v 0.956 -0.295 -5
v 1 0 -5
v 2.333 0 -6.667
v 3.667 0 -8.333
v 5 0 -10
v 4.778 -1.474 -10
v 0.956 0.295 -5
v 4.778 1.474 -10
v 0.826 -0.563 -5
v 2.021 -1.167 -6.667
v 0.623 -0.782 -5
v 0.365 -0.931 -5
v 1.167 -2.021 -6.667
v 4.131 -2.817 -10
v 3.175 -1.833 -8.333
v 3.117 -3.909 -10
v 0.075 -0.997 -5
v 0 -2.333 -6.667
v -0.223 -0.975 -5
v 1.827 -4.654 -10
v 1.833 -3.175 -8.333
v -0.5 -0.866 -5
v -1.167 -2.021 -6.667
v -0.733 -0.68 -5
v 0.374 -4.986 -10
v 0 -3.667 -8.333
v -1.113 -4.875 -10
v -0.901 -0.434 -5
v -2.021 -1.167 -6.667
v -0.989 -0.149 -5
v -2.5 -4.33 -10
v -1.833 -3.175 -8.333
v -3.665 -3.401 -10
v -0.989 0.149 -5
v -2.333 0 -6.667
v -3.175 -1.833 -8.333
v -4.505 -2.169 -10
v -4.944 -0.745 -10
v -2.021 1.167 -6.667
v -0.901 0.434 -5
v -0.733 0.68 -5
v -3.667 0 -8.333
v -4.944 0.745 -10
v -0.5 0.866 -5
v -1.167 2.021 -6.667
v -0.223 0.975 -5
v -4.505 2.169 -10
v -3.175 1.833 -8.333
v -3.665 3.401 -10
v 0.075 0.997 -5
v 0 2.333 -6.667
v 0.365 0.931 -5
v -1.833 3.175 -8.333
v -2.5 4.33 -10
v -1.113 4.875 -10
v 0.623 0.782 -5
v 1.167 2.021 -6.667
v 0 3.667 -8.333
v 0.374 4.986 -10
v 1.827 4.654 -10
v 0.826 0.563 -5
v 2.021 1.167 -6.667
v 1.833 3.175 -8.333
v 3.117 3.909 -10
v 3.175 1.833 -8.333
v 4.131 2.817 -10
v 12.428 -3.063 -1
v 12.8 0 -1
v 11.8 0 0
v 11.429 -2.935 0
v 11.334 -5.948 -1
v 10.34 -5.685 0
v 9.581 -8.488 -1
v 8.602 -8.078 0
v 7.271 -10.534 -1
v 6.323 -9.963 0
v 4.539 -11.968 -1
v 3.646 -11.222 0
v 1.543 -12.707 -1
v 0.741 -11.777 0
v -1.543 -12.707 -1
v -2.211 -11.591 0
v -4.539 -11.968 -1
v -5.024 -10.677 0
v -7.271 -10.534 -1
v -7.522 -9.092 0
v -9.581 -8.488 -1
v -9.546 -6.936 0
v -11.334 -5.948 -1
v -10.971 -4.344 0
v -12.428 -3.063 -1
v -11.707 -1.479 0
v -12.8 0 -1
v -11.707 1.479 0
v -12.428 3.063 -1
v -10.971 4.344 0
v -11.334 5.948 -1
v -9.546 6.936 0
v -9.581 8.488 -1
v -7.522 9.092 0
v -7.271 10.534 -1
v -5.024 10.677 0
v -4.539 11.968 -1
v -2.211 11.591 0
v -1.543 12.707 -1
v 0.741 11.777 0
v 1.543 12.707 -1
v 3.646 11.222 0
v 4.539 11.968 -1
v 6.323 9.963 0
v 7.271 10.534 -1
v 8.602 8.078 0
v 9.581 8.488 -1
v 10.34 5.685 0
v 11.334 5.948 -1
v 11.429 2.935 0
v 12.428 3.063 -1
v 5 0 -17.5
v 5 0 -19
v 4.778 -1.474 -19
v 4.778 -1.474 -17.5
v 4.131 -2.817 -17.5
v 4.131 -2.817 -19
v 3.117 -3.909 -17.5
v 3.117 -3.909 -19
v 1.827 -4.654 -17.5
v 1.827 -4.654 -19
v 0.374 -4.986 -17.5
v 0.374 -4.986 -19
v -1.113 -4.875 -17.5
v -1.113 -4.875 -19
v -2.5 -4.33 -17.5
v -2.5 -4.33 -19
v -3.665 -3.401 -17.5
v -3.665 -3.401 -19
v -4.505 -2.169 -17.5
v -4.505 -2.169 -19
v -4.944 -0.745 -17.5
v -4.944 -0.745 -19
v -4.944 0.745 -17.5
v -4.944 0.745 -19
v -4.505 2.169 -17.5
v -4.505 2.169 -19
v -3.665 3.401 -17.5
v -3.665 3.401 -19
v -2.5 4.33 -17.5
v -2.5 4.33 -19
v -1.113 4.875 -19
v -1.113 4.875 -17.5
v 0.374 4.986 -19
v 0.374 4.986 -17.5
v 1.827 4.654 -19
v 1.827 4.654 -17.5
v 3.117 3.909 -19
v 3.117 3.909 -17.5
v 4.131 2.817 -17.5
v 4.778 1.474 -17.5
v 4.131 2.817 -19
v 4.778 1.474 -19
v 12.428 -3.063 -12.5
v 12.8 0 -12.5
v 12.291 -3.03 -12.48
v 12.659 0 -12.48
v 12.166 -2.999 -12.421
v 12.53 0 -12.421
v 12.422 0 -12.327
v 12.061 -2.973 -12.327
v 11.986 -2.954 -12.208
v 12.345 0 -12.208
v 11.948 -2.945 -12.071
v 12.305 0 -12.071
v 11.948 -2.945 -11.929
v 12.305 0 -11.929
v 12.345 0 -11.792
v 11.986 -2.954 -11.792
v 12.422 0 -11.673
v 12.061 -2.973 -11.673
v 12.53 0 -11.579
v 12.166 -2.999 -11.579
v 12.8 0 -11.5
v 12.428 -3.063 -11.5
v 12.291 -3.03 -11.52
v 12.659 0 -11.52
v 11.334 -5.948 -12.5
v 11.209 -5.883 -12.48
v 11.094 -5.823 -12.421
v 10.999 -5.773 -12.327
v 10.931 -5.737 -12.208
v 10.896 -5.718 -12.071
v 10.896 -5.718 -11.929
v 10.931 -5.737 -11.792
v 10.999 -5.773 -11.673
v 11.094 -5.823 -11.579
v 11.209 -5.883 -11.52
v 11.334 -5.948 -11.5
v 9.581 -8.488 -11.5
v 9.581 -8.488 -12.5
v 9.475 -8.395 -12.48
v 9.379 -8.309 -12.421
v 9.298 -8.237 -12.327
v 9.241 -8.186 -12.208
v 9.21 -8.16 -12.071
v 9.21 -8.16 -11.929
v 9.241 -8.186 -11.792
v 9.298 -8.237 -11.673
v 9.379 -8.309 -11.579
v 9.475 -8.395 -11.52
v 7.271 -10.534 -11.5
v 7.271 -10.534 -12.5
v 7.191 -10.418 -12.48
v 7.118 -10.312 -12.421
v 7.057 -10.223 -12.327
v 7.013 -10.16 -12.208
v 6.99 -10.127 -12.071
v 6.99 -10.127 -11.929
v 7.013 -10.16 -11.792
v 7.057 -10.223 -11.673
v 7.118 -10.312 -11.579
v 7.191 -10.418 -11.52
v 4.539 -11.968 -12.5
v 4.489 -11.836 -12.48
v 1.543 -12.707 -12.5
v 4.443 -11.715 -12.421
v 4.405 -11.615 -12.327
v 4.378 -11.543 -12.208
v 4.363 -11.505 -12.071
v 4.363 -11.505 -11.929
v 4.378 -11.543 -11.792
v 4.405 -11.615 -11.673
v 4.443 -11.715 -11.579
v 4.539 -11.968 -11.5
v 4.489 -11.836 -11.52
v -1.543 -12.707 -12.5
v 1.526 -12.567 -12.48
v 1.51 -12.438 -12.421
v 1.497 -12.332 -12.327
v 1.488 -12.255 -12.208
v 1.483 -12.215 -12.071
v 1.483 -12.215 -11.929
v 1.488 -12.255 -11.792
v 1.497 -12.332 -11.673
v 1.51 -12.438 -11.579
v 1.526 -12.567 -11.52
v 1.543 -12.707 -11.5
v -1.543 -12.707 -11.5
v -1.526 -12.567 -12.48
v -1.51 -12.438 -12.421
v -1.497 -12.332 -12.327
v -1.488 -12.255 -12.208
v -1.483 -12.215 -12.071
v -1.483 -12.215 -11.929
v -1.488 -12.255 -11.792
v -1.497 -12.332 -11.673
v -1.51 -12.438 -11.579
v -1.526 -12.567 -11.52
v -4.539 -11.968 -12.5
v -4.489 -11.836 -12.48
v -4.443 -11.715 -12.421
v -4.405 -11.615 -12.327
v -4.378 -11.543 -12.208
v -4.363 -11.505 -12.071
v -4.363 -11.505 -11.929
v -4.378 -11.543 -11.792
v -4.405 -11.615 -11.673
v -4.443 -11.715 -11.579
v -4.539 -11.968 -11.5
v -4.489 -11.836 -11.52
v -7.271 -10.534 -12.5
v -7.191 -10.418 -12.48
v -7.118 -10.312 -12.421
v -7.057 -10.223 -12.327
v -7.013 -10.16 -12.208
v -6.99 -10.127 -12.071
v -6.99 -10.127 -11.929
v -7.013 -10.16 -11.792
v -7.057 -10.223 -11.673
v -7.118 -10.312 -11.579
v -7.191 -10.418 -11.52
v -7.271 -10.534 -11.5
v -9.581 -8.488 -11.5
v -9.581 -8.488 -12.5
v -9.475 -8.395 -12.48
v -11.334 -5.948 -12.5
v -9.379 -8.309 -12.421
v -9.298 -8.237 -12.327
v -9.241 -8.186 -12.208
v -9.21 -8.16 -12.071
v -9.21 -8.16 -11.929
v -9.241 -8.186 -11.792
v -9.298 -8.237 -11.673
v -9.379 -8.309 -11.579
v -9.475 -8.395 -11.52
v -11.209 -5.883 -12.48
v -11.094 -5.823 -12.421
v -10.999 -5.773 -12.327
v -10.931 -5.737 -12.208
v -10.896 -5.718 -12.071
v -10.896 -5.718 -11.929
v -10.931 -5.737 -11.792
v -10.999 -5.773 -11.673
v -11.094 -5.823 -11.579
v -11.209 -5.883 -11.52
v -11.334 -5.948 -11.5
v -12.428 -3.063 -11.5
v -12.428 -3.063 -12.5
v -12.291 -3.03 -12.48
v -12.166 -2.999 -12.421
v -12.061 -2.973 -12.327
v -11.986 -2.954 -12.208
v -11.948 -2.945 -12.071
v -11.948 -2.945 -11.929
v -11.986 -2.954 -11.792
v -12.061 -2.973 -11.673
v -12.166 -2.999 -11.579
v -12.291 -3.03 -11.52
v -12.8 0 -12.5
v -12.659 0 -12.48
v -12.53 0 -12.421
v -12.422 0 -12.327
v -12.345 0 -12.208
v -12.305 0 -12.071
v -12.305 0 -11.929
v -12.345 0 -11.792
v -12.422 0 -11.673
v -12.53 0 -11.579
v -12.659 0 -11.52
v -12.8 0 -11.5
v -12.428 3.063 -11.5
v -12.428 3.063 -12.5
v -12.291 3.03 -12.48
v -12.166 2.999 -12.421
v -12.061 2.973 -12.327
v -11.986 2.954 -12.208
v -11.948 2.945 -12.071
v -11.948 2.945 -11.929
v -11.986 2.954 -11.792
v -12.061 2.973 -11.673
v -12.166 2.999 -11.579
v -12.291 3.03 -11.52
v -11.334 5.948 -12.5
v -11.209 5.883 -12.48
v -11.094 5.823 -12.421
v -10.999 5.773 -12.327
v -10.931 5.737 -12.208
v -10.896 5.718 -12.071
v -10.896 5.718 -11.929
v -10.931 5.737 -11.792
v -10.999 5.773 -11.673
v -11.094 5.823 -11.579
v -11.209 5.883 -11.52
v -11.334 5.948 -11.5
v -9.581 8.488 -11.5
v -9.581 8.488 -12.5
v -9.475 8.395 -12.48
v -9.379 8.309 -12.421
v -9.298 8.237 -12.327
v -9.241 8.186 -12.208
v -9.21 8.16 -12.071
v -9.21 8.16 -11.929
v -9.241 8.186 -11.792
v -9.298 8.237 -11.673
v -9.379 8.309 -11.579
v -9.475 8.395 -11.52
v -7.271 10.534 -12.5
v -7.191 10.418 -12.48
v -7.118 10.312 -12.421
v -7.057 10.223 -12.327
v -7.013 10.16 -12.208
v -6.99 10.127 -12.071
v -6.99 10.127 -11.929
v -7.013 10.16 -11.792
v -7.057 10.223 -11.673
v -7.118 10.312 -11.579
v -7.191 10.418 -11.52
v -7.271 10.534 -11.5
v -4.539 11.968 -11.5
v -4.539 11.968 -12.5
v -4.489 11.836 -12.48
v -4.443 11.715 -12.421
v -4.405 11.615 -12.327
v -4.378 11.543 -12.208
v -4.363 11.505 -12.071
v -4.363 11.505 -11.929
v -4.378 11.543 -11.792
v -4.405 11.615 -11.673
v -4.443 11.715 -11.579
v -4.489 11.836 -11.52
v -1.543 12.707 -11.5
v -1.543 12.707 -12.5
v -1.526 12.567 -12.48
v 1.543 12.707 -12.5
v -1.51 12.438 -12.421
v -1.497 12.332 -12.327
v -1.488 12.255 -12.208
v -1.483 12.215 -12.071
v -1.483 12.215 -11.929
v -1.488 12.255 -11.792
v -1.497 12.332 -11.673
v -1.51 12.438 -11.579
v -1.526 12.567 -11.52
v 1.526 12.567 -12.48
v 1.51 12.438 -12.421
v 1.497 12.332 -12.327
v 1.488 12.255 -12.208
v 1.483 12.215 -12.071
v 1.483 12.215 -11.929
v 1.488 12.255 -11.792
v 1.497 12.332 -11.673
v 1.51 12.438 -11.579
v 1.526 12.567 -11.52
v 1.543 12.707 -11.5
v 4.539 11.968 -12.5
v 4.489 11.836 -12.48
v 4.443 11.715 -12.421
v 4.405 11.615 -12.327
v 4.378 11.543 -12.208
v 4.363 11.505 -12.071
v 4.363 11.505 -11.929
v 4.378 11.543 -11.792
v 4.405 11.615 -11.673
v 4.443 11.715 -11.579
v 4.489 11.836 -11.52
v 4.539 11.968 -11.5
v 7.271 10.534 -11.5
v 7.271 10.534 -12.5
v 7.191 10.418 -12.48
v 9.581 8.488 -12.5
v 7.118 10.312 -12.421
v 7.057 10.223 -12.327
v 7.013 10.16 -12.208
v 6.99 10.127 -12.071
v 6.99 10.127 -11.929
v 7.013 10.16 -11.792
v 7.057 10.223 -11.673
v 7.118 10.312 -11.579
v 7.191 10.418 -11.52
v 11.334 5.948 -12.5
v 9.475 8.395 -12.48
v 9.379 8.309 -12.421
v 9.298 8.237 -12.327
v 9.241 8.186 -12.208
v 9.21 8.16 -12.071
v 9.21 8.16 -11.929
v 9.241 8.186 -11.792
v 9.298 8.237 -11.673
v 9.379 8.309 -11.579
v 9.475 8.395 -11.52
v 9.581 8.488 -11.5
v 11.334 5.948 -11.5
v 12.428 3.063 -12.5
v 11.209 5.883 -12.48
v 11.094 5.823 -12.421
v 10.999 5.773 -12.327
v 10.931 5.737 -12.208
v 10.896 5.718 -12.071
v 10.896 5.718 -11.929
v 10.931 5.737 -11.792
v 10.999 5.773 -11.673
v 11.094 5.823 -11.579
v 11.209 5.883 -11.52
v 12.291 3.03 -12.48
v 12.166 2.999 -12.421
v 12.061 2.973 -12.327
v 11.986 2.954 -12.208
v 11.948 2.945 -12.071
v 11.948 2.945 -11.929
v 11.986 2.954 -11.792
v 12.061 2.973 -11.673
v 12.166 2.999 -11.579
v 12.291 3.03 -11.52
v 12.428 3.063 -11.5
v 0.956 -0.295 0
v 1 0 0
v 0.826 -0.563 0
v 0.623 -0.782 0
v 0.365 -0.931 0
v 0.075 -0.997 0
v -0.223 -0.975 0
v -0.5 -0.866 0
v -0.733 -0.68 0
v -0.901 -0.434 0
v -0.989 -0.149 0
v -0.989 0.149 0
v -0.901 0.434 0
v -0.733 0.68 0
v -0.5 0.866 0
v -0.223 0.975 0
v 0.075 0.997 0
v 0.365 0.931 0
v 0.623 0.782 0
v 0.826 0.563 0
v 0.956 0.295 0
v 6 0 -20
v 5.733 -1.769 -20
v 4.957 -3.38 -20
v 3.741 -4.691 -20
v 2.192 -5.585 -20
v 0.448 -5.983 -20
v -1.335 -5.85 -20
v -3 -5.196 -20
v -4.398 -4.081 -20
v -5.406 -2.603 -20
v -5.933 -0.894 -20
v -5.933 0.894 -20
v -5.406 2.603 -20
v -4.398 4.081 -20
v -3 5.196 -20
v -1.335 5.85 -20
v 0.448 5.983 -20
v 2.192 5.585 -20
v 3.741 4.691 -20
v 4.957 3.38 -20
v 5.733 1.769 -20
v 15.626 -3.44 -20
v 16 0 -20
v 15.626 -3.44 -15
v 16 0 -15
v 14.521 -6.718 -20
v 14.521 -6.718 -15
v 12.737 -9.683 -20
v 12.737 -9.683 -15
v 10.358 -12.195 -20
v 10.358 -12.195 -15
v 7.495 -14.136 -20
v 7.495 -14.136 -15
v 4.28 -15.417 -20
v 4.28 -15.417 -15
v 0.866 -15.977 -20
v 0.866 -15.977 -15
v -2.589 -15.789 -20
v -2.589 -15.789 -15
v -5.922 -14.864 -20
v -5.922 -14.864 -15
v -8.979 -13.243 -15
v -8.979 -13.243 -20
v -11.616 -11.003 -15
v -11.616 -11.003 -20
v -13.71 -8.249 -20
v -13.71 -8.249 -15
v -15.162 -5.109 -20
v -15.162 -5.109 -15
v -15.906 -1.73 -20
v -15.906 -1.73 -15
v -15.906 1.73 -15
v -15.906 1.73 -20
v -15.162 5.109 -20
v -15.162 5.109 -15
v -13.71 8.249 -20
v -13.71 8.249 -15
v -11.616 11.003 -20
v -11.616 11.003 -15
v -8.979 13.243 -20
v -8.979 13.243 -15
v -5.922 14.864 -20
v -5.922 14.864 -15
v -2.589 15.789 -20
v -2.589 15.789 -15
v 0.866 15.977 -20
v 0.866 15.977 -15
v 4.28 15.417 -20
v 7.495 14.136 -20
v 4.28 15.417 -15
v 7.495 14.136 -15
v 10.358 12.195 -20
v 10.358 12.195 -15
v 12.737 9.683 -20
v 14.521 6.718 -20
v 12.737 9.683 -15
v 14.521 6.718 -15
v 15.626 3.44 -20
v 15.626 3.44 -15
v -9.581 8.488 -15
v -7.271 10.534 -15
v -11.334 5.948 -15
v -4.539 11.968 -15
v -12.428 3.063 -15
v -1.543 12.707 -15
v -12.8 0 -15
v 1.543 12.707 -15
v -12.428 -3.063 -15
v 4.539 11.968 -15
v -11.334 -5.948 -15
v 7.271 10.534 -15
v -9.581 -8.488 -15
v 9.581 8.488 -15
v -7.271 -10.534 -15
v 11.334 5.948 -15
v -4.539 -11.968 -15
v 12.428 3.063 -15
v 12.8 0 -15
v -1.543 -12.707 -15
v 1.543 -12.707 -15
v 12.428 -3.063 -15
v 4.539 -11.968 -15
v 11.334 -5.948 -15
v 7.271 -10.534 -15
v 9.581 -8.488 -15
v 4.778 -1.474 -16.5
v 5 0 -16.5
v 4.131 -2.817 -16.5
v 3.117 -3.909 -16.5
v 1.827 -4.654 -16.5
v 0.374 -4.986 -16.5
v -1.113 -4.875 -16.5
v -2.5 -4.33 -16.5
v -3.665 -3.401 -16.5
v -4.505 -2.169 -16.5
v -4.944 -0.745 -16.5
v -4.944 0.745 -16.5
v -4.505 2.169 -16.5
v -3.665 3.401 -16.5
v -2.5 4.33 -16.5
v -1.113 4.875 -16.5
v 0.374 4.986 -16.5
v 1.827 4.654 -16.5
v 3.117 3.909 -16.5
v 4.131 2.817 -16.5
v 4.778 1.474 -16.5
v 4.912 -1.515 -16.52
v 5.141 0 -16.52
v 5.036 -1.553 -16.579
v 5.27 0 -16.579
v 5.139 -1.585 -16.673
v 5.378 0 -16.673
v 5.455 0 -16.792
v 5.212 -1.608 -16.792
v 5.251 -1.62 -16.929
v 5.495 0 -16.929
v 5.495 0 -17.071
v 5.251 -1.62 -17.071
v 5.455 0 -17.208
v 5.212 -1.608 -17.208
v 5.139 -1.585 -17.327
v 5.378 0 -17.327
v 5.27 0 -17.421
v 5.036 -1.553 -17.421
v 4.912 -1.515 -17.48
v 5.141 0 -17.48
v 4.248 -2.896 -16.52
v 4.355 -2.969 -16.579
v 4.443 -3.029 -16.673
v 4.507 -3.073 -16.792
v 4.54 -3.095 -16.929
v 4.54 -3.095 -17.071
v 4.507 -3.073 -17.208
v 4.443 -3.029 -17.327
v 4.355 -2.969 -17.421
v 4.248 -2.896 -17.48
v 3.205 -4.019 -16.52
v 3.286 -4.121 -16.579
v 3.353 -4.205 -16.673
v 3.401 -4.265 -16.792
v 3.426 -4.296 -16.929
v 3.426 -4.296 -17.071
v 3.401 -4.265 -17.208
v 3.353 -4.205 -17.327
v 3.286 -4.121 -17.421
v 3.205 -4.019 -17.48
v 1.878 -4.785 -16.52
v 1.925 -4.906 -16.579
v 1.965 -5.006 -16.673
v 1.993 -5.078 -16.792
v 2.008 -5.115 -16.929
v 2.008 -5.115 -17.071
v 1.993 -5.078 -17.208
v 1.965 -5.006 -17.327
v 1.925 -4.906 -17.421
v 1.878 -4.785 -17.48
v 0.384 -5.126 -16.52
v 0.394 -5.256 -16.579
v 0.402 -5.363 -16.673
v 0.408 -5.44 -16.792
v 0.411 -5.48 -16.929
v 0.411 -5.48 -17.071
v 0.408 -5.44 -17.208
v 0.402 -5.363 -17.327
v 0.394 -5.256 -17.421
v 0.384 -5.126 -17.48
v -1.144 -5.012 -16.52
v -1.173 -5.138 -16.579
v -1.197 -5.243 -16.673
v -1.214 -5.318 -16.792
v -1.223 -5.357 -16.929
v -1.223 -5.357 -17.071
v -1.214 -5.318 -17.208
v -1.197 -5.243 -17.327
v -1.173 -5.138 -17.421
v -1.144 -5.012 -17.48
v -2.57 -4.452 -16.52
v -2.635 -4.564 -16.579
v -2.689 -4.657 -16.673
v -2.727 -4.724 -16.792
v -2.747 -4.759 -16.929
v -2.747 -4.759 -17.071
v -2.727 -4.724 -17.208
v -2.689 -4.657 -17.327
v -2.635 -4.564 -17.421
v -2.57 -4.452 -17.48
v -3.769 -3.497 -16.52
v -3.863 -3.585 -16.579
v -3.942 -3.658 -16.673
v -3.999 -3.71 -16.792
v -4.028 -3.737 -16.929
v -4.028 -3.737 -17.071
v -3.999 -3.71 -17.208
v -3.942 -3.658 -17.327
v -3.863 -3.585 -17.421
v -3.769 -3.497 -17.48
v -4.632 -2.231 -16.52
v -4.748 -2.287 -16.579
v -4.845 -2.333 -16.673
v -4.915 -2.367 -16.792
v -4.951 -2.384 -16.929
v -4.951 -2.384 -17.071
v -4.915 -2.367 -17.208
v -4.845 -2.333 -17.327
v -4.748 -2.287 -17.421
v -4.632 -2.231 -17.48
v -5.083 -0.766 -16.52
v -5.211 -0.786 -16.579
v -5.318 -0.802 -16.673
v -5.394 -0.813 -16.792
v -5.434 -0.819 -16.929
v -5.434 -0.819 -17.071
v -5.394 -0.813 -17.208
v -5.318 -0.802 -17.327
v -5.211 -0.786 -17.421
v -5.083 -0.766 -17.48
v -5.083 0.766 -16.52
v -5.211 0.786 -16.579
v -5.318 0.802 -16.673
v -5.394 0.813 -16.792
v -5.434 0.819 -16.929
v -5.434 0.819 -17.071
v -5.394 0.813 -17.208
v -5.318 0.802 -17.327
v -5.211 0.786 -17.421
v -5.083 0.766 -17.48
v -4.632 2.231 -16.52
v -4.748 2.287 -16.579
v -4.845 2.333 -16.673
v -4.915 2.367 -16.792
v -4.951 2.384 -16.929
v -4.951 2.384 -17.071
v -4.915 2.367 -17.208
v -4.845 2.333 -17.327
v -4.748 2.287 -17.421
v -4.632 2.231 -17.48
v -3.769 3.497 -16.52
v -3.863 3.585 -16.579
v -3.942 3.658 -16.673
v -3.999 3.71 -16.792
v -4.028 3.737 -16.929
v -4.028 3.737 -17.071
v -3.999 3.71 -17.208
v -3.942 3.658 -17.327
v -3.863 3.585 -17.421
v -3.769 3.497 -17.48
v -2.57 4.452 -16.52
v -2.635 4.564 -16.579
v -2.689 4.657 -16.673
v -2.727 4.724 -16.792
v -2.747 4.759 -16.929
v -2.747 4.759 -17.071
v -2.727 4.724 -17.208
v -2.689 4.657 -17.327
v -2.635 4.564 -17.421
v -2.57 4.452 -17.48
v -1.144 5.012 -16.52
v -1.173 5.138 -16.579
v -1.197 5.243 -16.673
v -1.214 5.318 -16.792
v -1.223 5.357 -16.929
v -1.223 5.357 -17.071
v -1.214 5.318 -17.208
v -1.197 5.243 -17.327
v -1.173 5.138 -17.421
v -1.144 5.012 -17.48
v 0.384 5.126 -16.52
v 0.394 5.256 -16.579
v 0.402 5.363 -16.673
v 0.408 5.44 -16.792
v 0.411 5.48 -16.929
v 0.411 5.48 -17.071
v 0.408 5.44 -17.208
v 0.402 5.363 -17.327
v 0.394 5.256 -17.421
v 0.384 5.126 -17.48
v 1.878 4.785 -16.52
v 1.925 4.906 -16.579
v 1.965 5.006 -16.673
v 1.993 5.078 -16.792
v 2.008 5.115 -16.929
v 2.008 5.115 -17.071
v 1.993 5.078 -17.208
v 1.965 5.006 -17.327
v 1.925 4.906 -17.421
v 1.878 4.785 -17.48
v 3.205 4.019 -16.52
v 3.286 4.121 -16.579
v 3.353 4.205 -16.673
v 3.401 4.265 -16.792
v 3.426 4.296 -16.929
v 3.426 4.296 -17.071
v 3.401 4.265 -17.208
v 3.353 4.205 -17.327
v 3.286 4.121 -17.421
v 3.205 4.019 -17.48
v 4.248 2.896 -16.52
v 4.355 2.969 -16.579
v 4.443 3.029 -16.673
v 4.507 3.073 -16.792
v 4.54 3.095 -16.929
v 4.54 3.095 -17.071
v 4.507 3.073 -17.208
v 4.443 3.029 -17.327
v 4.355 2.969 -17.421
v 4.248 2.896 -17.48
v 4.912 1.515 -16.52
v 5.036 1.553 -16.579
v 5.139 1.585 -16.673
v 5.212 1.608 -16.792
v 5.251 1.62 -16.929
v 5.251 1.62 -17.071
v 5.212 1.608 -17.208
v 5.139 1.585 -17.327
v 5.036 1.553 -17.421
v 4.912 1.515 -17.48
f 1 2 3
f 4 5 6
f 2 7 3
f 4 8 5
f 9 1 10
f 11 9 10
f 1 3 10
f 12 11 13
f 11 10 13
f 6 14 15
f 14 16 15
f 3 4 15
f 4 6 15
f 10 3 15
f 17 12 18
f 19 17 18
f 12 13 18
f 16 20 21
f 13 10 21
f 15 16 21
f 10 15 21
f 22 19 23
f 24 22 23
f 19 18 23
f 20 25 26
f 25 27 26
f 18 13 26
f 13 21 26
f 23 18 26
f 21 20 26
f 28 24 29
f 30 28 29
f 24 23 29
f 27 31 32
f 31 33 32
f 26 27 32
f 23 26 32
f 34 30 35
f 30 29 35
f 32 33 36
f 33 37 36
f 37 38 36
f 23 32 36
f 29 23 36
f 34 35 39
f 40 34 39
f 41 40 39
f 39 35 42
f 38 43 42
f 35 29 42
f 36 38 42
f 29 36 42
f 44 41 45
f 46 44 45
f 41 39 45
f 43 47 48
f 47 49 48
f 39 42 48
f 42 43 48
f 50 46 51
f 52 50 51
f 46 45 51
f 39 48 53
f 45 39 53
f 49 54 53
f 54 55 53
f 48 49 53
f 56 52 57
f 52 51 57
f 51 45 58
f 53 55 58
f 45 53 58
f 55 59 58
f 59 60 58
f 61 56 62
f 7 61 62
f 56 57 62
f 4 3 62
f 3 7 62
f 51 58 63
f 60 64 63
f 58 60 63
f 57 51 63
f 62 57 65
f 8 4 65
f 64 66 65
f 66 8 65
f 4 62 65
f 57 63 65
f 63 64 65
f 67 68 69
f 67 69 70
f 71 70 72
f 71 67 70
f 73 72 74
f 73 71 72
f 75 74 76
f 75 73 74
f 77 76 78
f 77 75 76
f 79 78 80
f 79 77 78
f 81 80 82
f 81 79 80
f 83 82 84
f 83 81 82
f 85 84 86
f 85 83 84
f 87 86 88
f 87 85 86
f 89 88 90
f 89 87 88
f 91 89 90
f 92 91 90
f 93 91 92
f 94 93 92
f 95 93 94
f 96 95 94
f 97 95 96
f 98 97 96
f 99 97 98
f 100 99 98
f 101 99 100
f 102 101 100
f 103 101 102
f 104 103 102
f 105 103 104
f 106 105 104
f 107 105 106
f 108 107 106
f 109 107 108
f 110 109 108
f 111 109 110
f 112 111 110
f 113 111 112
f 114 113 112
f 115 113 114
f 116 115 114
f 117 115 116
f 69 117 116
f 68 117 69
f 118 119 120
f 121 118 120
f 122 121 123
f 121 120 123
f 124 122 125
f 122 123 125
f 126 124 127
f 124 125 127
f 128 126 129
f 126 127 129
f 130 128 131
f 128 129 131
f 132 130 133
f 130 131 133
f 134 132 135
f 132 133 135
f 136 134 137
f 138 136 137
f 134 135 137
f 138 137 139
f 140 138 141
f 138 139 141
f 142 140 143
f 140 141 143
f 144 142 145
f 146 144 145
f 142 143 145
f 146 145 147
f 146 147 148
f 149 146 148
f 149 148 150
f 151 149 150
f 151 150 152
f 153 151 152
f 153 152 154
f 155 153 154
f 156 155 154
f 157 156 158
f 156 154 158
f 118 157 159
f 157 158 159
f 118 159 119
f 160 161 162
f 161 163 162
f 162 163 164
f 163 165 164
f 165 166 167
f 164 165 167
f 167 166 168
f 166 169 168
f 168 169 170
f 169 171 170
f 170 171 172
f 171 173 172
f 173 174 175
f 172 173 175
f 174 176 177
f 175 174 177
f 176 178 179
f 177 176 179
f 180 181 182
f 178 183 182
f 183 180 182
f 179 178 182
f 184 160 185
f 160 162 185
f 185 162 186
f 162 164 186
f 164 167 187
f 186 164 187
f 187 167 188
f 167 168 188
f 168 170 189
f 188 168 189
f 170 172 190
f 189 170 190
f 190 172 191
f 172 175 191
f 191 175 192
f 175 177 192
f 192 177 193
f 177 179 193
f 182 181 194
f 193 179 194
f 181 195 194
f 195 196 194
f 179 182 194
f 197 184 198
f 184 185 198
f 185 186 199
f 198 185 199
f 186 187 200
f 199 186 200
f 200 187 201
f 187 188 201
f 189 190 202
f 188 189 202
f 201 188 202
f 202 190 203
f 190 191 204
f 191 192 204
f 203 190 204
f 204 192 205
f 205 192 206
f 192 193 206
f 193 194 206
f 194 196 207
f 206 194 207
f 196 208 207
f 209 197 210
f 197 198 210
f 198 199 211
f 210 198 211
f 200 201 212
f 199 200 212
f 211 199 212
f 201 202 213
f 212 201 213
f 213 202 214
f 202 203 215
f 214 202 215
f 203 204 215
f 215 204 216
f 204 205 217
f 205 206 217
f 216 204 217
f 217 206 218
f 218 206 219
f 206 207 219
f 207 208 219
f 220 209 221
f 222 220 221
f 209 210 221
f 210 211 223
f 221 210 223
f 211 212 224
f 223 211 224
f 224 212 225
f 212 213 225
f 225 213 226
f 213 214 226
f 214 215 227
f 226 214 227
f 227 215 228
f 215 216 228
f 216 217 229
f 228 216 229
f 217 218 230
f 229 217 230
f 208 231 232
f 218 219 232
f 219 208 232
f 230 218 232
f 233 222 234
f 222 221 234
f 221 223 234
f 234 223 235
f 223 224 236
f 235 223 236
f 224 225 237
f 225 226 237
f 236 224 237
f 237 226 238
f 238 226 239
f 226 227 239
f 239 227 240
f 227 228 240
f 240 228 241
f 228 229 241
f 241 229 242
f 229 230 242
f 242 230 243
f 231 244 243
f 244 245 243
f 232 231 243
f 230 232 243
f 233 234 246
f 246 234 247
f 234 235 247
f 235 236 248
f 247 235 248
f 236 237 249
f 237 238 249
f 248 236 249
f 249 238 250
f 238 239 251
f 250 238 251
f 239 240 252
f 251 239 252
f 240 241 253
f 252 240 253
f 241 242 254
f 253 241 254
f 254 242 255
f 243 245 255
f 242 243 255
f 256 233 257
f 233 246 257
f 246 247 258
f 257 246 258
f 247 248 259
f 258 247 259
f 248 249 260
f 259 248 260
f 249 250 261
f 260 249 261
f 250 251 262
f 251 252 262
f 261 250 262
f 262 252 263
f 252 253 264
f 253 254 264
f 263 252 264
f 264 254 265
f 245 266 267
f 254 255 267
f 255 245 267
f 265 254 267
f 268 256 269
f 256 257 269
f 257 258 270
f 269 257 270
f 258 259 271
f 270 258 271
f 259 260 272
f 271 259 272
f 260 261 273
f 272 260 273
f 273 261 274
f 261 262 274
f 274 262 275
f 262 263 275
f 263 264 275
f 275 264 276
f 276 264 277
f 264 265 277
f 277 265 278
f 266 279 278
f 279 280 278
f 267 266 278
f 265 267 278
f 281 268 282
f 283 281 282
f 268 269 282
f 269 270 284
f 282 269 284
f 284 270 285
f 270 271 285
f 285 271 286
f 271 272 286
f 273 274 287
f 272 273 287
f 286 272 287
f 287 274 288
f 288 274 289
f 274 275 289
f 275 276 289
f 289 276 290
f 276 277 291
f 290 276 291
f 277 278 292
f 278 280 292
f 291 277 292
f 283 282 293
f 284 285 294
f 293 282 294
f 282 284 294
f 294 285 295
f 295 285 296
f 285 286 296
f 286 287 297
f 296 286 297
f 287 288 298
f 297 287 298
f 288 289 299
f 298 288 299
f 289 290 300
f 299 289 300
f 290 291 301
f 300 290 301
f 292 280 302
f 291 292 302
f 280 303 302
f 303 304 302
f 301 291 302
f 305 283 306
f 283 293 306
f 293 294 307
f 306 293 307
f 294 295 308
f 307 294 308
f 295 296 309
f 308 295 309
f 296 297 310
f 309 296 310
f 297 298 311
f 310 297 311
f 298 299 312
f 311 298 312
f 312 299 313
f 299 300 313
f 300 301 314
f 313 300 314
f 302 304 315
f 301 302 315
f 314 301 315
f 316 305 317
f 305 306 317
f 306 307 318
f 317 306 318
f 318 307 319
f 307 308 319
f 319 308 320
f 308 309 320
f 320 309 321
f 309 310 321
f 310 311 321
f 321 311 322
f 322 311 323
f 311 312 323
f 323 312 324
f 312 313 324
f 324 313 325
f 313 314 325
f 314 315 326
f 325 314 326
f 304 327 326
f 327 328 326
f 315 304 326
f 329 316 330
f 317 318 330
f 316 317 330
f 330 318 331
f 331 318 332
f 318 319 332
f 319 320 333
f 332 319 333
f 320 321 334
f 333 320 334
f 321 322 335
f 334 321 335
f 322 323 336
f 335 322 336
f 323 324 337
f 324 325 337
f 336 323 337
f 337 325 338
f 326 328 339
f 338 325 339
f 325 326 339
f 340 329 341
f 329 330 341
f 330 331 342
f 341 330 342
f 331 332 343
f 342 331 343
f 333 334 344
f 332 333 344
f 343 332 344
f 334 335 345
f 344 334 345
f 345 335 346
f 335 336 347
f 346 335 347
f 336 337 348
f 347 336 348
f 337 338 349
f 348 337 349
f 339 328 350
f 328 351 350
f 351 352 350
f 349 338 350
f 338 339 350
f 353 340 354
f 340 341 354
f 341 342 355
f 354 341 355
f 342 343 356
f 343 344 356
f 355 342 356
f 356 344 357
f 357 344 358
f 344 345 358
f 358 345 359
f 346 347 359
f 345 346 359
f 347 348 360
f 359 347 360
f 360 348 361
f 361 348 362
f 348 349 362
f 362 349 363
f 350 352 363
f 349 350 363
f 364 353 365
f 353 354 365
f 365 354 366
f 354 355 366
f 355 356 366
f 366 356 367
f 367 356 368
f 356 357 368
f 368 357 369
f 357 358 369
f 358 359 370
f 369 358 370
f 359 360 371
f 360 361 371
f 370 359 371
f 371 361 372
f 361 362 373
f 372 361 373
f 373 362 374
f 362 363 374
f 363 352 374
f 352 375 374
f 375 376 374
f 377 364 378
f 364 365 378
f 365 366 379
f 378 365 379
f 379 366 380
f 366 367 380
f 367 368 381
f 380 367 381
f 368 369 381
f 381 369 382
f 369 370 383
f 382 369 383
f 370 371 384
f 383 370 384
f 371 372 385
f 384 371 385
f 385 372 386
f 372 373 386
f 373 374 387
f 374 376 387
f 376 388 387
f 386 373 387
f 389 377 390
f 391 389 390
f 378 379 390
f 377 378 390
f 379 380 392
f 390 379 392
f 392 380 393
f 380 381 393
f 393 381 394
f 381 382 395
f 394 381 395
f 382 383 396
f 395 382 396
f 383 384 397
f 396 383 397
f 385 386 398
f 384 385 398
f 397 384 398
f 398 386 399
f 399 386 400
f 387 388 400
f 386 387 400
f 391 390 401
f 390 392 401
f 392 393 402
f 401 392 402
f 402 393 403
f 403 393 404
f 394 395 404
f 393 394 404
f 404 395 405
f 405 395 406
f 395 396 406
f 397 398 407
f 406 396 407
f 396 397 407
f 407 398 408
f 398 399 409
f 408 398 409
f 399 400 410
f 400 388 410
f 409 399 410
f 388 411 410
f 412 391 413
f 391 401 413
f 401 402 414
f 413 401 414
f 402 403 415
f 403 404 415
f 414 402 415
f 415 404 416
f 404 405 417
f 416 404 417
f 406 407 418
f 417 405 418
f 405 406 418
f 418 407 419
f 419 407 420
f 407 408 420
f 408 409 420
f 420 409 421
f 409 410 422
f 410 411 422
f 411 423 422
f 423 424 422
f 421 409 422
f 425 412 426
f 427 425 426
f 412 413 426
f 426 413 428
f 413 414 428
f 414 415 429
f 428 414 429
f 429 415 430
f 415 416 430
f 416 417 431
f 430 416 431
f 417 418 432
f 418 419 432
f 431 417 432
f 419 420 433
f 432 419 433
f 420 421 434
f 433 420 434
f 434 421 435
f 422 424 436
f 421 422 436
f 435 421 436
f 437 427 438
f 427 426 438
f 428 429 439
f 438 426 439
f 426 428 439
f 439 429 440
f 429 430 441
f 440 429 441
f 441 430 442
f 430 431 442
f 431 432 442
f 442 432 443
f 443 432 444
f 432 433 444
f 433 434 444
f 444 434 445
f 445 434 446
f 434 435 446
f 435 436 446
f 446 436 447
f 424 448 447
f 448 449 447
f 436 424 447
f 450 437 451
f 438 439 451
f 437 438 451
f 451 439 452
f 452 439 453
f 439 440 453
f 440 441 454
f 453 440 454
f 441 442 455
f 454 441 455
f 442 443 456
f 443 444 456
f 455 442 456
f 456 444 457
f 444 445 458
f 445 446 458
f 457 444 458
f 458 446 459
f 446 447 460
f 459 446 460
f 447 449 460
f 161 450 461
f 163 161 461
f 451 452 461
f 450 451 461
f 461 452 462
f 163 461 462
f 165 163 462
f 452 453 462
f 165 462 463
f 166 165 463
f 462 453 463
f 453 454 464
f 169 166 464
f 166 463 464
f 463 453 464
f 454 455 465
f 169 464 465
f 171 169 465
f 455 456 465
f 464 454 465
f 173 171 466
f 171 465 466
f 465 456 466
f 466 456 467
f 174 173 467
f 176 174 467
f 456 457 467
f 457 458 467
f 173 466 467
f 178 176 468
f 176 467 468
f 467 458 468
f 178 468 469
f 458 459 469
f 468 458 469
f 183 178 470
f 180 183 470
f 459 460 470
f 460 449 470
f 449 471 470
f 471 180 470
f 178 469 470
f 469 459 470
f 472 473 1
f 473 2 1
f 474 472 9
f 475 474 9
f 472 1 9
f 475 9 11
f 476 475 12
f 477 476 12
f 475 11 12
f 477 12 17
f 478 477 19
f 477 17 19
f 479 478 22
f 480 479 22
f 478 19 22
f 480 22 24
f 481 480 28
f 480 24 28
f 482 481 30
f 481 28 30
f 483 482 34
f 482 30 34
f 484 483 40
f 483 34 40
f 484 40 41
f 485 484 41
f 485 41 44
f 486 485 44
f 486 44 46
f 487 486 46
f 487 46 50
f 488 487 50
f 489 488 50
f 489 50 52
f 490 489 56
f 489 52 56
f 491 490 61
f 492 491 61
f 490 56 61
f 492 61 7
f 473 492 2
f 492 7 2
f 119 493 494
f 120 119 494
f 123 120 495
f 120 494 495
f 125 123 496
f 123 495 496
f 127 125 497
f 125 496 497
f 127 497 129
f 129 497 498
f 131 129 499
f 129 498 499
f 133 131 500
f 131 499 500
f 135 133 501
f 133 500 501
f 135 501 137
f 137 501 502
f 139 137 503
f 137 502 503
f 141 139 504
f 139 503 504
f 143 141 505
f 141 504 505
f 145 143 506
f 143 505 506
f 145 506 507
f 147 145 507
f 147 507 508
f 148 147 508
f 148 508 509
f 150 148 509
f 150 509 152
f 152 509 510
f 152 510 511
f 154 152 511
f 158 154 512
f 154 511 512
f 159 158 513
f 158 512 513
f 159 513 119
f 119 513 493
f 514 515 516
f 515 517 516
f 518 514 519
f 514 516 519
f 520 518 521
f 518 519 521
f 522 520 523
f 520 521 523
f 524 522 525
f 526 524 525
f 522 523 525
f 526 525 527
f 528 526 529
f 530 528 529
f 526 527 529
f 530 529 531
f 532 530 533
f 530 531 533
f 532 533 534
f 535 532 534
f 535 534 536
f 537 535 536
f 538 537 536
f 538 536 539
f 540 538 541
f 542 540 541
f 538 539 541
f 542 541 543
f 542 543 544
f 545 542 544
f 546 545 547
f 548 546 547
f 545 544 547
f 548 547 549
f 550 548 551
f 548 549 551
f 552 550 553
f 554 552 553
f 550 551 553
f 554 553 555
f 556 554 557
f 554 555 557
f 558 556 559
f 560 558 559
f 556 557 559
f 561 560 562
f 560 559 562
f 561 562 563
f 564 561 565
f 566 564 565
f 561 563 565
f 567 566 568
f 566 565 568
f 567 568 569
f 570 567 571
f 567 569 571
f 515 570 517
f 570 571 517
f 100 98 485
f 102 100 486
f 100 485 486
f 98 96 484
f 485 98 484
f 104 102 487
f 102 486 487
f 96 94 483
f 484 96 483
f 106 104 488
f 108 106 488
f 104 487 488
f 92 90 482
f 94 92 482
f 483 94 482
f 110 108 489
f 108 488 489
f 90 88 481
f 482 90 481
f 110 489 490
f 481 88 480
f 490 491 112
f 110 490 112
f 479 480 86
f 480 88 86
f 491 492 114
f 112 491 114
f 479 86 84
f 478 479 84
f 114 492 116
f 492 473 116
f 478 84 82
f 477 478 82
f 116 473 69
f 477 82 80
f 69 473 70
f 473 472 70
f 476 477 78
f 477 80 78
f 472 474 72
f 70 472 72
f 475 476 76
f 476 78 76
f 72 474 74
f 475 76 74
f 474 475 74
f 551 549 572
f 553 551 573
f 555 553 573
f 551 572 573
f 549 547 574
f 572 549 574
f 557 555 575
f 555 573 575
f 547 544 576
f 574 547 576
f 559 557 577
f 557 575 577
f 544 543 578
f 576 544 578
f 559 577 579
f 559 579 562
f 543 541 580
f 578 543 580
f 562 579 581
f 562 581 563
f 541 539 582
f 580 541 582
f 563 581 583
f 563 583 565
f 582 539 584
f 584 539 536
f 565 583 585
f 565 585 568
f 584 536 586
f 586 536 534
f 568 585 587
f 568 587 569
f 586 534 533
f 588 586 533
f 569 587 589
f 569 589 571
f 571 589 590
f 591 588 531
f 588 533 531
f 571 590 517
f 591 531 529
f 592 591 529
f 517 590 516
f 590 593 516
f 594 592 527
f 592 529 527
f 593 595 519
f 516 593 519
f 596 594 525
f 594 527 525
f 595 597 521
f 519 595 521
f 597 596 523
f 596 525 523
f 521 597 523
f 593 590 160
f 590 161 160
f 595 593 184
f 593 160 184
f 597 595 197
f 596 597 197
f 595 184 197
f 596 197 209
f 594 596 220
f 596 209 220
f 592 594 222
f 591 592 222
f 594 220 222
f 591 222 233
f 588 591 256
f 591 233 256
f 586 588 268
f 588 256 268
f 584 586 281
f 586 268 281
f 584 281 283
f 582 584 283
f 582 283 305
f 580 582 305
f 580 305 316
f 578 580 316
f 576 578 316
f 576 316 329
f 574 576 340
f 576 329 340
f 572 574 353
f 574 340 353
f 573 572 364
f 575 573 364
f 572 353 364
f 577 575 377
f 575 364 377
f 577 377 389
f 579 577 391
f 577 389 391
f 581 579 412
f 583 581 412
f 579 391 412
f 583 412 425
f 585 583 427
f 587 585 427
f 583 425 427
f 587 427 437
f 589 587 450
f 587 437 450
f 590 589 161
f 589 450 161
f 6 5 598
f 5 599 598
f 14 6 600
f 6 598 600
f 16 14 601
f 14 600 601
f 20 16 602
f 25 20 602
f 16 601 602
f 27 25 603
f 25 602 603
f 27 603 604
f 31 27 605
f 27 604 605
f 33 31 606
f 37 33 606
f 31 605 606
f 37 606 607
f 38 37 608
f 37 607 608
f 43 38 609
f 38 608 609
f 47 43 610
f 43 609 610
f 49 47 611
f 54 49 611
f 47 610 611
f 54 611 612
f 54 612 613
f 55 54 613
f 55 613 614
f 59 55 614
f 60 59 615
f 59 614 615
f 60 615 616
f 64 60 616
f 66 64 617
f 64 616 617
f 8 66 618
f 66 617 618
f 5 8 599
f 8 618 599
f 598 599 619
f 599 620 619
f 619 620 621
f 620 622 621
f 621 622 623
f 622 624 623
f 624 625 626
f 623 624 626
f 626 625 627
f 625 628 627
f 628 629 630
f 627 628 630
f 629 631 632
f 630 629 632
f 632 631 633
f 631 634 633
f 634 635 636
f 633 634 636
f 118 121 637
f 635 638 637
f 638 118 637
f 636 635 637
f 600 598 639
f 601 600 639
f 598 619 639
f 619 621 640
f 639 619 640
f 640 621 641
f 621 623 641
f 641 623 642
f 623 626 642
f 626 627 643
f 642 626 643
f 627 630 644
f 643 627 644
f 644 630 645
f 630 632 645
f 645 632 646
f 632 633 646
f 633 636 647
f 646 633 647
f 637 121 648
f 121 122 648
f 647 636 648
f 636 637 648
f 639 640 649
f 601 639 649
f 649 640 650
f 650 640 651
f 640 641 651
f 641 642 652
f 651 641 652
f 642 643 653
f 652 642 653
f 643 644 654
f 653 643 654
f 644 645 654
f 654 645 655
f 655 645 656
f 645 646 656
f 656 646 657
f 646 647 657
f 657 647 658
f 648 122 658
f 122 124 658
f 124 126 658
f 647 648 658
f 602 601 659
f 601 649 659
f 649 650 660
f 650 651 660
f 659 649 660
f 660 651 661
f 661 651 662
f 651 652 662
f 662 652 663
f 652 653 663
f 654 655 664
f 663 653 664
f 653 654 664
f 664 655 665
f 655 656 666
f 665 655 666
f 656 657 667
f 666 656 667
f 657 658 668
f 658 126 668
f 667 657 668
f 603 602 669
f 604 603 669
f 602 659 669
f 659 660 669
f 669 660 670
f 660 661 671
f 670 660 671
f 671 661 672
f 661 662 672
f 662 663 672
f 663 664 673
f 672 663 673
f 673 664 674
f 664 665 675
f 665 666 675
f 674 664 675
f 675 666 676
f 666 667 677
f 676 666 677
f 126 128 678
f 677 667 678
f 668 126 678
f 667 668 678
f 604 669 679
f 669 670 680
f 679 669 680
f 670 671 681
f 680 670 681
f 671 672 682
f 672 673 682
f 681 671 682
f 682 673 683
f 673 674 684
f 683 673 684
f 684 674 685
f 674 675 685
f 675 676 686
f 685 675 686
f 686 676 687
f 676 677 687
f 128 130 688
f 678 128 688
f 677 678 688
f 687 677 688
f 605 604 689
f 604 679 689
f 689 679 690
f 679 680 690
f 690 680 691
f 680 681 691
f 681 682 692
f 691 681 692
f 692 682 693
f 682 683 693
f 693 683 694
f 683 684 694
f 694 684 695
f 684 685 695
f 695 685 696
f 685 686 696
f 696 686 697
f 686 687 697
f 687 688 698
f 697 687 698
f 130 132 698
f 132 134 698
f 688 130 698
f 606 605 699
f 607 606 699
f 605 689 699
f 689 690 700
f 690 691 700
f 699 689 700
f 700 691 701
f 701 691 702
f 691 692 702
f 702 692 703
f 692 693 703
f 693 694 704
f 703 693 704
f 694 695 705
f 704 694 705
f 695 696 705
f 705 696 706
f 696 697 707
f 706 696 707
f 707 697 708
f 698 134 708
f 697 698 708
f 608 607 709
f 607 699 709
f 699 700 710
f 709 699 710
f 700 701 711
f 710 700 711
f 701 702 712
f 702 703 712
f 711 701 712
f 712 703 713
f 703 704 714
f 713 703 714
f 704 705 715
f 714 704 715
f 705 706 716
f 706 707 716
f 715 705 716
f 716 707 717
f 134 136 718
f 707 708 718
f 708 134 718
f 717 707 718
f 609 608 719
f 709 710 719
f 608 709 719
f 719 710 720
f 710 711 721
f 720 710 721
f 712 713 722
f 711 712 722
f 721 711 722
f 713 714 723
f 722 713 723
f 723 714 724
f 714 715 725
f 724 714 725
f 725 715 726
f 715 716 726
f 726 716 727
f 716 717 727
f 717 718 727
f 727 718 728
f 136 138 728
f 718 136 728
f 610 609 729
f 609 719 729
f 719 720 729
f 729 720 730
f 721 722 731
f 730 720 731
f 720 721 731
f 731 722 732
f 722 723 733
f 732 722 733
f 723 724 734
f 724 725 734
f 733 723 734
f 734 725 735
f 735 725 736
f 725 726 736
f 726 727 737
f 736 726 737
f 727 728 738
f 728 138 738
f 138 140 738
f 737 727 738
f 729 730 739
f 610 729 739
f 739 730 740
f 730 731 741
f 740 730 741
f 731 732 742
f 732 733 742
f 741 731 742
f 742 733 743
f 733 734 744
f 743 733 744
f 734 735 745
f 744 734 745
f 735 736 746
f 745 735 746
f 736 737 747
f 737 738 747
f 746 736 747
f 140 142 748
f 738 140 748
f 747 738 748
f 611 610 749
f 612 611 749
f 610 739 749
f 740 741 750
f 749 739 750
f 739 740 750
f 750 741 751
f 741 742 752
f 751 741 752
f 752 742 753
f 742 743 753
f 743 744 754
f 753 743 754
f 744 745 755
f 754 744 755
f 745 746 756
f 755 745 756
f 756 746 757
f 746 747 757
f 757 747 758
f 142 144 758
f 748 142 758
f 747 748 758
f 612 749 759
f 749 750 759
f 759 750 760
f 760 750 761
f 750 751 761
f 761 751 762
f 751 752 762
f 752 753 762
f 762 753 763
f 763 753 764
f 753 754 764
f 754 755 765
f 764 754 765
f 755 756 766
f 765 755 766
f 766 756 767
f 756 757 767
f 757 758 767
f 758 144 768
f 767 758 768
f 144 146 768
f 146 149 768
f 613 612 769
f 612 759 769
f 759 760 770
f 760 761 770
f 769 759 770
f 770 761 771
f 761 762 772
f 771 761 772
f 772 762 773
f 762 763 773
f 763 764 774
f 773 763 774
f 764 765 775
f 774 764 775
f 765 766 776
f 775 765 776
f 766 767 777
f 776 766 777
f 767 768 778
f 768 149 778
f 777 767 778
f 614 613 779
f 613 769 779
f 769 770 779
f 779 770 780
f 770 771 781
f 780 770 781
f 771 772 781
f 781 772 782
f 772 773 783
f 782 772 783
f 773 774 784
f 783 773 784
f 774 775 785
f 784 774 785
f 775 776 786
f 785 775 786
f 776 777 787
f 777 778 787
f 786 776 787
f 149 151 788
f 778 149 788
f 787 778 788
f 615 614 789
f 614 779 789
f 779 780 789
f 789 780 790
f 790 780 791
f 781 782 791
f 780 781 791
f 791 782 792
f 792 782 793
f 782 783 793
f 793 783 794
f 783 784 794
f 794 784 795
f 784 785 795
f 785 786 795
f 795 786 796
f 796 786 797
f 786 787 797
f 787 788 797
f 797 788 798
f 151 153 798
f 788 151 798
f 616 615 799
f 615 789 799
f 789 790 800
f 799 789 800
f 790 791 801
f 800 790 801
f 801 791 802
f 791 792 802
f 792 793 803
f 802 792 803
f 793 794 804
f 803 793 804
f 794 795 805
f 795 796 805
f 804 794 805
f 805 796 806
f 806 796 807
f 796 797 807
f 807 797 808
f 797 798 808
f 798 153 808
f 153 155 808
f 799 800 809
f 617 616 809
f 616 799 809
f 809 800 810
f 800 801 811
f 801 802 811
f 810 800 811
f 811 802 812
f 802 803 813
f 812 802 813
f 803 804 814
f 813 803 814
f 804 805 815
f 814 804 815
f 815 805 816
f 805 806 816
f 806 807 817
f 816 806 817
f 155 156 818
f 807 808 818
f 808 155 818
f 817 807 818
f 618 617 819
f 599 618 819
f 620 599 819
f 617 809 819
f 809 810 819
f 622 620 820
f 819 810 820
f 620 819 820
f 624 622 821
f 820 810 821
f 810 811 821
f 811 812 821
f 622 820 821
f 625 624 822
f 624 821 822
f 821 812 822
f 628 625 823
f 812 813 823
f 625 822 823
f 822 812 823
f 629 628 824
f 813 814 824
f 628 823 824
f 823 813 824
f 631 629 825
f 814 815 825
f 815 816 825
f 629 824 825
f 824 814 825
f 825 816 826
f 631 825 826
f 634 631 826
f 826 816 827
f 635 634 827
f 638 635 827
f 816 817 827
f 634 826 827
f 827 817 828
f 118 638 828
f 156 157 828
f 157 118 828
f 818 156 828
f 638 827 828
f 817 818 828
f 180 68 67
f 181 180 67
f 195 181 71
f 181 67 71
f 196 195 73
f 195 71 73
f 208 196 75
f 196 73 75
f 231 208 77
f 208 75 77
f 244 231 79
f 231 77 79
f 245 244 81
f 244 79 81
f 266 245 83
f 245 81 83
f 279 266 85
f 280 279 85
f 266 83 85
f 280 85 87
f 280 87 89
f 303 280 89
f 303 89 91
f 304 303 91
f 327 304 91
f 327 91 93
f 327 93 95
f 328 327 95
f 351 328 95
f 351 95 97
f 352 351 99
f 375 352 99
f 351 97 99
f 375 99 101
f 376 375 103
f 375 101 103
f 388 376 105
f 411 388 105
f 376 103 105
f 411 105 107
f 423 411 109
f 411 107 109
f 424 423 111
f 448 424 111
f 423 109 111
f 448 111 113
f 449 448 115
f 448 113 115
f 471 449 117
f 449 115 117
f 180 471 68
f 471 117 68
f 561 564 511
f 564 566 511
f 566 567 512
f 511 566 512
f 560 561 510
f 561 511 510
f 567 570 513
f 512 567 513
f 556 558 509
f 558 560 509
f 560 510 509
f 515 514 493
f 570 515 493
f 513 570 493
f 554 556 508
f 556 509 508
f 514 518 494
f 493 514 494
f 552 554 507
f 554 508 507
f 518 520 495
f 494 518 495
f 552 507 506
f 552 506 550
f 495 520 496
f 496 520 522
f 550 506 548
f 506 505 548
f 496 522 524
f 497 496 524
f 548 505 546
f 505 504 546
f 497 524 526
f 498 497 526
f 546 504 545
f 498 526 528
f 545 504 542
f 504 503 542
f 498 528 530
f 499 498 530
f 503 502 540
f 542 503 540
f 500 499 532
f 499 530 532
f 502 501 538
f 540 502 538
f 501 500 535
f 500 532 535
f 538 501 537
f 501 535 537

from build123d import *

# Parameters (mm, degrees)
F2_SIZE = 1
F3_SIZE = 1


with BuildPart() as f1:
    # F0 (on Front) → F1 (revolve)
    with BuildSketch(Plane.XZ):
        with BuildLine():
            Line((12.8, 0), (1, 0))
            Line((1, 0), (1, -5))
            Line((1, -5), (5, -10))
            Line((5, -10), (5, -16.5))
            ThreePointArc((5, -16.5), (5.5, -17), (5, -17.5))
            Line((5, -17.5), (5, -20))
            Line((5, -20), (16, -20))
            Line((16, -20), (16, -15))
            Line((16, -15), (12.8, -15))
            Line((12.8, -15), (12.8, -12.5))
            ThreePointArc((12.8, -12.5), (12.3, -12), (12.8, -11.5))
            Line((12.8, -11.5), (12.8, 0))
        make_face()
    revolve(axis=Axis((0, 0, -16.444752), (0, 0, -1)))

    # F2
    f2_edges = [f1.edges().sort_by_distance(p)[0] for p in [
        (-12.8, 0, 0),
    ]]
    chamfer(f2_edges, length=F2_SIZE)

    # F3
    f3_edges = [f1.edges().sort_by_distance(p)[0] for p in [
        (-5, 0, -20),
    ]]
    chamfer(f3_edges, length=F3_SIZE)


solid = f1.part
